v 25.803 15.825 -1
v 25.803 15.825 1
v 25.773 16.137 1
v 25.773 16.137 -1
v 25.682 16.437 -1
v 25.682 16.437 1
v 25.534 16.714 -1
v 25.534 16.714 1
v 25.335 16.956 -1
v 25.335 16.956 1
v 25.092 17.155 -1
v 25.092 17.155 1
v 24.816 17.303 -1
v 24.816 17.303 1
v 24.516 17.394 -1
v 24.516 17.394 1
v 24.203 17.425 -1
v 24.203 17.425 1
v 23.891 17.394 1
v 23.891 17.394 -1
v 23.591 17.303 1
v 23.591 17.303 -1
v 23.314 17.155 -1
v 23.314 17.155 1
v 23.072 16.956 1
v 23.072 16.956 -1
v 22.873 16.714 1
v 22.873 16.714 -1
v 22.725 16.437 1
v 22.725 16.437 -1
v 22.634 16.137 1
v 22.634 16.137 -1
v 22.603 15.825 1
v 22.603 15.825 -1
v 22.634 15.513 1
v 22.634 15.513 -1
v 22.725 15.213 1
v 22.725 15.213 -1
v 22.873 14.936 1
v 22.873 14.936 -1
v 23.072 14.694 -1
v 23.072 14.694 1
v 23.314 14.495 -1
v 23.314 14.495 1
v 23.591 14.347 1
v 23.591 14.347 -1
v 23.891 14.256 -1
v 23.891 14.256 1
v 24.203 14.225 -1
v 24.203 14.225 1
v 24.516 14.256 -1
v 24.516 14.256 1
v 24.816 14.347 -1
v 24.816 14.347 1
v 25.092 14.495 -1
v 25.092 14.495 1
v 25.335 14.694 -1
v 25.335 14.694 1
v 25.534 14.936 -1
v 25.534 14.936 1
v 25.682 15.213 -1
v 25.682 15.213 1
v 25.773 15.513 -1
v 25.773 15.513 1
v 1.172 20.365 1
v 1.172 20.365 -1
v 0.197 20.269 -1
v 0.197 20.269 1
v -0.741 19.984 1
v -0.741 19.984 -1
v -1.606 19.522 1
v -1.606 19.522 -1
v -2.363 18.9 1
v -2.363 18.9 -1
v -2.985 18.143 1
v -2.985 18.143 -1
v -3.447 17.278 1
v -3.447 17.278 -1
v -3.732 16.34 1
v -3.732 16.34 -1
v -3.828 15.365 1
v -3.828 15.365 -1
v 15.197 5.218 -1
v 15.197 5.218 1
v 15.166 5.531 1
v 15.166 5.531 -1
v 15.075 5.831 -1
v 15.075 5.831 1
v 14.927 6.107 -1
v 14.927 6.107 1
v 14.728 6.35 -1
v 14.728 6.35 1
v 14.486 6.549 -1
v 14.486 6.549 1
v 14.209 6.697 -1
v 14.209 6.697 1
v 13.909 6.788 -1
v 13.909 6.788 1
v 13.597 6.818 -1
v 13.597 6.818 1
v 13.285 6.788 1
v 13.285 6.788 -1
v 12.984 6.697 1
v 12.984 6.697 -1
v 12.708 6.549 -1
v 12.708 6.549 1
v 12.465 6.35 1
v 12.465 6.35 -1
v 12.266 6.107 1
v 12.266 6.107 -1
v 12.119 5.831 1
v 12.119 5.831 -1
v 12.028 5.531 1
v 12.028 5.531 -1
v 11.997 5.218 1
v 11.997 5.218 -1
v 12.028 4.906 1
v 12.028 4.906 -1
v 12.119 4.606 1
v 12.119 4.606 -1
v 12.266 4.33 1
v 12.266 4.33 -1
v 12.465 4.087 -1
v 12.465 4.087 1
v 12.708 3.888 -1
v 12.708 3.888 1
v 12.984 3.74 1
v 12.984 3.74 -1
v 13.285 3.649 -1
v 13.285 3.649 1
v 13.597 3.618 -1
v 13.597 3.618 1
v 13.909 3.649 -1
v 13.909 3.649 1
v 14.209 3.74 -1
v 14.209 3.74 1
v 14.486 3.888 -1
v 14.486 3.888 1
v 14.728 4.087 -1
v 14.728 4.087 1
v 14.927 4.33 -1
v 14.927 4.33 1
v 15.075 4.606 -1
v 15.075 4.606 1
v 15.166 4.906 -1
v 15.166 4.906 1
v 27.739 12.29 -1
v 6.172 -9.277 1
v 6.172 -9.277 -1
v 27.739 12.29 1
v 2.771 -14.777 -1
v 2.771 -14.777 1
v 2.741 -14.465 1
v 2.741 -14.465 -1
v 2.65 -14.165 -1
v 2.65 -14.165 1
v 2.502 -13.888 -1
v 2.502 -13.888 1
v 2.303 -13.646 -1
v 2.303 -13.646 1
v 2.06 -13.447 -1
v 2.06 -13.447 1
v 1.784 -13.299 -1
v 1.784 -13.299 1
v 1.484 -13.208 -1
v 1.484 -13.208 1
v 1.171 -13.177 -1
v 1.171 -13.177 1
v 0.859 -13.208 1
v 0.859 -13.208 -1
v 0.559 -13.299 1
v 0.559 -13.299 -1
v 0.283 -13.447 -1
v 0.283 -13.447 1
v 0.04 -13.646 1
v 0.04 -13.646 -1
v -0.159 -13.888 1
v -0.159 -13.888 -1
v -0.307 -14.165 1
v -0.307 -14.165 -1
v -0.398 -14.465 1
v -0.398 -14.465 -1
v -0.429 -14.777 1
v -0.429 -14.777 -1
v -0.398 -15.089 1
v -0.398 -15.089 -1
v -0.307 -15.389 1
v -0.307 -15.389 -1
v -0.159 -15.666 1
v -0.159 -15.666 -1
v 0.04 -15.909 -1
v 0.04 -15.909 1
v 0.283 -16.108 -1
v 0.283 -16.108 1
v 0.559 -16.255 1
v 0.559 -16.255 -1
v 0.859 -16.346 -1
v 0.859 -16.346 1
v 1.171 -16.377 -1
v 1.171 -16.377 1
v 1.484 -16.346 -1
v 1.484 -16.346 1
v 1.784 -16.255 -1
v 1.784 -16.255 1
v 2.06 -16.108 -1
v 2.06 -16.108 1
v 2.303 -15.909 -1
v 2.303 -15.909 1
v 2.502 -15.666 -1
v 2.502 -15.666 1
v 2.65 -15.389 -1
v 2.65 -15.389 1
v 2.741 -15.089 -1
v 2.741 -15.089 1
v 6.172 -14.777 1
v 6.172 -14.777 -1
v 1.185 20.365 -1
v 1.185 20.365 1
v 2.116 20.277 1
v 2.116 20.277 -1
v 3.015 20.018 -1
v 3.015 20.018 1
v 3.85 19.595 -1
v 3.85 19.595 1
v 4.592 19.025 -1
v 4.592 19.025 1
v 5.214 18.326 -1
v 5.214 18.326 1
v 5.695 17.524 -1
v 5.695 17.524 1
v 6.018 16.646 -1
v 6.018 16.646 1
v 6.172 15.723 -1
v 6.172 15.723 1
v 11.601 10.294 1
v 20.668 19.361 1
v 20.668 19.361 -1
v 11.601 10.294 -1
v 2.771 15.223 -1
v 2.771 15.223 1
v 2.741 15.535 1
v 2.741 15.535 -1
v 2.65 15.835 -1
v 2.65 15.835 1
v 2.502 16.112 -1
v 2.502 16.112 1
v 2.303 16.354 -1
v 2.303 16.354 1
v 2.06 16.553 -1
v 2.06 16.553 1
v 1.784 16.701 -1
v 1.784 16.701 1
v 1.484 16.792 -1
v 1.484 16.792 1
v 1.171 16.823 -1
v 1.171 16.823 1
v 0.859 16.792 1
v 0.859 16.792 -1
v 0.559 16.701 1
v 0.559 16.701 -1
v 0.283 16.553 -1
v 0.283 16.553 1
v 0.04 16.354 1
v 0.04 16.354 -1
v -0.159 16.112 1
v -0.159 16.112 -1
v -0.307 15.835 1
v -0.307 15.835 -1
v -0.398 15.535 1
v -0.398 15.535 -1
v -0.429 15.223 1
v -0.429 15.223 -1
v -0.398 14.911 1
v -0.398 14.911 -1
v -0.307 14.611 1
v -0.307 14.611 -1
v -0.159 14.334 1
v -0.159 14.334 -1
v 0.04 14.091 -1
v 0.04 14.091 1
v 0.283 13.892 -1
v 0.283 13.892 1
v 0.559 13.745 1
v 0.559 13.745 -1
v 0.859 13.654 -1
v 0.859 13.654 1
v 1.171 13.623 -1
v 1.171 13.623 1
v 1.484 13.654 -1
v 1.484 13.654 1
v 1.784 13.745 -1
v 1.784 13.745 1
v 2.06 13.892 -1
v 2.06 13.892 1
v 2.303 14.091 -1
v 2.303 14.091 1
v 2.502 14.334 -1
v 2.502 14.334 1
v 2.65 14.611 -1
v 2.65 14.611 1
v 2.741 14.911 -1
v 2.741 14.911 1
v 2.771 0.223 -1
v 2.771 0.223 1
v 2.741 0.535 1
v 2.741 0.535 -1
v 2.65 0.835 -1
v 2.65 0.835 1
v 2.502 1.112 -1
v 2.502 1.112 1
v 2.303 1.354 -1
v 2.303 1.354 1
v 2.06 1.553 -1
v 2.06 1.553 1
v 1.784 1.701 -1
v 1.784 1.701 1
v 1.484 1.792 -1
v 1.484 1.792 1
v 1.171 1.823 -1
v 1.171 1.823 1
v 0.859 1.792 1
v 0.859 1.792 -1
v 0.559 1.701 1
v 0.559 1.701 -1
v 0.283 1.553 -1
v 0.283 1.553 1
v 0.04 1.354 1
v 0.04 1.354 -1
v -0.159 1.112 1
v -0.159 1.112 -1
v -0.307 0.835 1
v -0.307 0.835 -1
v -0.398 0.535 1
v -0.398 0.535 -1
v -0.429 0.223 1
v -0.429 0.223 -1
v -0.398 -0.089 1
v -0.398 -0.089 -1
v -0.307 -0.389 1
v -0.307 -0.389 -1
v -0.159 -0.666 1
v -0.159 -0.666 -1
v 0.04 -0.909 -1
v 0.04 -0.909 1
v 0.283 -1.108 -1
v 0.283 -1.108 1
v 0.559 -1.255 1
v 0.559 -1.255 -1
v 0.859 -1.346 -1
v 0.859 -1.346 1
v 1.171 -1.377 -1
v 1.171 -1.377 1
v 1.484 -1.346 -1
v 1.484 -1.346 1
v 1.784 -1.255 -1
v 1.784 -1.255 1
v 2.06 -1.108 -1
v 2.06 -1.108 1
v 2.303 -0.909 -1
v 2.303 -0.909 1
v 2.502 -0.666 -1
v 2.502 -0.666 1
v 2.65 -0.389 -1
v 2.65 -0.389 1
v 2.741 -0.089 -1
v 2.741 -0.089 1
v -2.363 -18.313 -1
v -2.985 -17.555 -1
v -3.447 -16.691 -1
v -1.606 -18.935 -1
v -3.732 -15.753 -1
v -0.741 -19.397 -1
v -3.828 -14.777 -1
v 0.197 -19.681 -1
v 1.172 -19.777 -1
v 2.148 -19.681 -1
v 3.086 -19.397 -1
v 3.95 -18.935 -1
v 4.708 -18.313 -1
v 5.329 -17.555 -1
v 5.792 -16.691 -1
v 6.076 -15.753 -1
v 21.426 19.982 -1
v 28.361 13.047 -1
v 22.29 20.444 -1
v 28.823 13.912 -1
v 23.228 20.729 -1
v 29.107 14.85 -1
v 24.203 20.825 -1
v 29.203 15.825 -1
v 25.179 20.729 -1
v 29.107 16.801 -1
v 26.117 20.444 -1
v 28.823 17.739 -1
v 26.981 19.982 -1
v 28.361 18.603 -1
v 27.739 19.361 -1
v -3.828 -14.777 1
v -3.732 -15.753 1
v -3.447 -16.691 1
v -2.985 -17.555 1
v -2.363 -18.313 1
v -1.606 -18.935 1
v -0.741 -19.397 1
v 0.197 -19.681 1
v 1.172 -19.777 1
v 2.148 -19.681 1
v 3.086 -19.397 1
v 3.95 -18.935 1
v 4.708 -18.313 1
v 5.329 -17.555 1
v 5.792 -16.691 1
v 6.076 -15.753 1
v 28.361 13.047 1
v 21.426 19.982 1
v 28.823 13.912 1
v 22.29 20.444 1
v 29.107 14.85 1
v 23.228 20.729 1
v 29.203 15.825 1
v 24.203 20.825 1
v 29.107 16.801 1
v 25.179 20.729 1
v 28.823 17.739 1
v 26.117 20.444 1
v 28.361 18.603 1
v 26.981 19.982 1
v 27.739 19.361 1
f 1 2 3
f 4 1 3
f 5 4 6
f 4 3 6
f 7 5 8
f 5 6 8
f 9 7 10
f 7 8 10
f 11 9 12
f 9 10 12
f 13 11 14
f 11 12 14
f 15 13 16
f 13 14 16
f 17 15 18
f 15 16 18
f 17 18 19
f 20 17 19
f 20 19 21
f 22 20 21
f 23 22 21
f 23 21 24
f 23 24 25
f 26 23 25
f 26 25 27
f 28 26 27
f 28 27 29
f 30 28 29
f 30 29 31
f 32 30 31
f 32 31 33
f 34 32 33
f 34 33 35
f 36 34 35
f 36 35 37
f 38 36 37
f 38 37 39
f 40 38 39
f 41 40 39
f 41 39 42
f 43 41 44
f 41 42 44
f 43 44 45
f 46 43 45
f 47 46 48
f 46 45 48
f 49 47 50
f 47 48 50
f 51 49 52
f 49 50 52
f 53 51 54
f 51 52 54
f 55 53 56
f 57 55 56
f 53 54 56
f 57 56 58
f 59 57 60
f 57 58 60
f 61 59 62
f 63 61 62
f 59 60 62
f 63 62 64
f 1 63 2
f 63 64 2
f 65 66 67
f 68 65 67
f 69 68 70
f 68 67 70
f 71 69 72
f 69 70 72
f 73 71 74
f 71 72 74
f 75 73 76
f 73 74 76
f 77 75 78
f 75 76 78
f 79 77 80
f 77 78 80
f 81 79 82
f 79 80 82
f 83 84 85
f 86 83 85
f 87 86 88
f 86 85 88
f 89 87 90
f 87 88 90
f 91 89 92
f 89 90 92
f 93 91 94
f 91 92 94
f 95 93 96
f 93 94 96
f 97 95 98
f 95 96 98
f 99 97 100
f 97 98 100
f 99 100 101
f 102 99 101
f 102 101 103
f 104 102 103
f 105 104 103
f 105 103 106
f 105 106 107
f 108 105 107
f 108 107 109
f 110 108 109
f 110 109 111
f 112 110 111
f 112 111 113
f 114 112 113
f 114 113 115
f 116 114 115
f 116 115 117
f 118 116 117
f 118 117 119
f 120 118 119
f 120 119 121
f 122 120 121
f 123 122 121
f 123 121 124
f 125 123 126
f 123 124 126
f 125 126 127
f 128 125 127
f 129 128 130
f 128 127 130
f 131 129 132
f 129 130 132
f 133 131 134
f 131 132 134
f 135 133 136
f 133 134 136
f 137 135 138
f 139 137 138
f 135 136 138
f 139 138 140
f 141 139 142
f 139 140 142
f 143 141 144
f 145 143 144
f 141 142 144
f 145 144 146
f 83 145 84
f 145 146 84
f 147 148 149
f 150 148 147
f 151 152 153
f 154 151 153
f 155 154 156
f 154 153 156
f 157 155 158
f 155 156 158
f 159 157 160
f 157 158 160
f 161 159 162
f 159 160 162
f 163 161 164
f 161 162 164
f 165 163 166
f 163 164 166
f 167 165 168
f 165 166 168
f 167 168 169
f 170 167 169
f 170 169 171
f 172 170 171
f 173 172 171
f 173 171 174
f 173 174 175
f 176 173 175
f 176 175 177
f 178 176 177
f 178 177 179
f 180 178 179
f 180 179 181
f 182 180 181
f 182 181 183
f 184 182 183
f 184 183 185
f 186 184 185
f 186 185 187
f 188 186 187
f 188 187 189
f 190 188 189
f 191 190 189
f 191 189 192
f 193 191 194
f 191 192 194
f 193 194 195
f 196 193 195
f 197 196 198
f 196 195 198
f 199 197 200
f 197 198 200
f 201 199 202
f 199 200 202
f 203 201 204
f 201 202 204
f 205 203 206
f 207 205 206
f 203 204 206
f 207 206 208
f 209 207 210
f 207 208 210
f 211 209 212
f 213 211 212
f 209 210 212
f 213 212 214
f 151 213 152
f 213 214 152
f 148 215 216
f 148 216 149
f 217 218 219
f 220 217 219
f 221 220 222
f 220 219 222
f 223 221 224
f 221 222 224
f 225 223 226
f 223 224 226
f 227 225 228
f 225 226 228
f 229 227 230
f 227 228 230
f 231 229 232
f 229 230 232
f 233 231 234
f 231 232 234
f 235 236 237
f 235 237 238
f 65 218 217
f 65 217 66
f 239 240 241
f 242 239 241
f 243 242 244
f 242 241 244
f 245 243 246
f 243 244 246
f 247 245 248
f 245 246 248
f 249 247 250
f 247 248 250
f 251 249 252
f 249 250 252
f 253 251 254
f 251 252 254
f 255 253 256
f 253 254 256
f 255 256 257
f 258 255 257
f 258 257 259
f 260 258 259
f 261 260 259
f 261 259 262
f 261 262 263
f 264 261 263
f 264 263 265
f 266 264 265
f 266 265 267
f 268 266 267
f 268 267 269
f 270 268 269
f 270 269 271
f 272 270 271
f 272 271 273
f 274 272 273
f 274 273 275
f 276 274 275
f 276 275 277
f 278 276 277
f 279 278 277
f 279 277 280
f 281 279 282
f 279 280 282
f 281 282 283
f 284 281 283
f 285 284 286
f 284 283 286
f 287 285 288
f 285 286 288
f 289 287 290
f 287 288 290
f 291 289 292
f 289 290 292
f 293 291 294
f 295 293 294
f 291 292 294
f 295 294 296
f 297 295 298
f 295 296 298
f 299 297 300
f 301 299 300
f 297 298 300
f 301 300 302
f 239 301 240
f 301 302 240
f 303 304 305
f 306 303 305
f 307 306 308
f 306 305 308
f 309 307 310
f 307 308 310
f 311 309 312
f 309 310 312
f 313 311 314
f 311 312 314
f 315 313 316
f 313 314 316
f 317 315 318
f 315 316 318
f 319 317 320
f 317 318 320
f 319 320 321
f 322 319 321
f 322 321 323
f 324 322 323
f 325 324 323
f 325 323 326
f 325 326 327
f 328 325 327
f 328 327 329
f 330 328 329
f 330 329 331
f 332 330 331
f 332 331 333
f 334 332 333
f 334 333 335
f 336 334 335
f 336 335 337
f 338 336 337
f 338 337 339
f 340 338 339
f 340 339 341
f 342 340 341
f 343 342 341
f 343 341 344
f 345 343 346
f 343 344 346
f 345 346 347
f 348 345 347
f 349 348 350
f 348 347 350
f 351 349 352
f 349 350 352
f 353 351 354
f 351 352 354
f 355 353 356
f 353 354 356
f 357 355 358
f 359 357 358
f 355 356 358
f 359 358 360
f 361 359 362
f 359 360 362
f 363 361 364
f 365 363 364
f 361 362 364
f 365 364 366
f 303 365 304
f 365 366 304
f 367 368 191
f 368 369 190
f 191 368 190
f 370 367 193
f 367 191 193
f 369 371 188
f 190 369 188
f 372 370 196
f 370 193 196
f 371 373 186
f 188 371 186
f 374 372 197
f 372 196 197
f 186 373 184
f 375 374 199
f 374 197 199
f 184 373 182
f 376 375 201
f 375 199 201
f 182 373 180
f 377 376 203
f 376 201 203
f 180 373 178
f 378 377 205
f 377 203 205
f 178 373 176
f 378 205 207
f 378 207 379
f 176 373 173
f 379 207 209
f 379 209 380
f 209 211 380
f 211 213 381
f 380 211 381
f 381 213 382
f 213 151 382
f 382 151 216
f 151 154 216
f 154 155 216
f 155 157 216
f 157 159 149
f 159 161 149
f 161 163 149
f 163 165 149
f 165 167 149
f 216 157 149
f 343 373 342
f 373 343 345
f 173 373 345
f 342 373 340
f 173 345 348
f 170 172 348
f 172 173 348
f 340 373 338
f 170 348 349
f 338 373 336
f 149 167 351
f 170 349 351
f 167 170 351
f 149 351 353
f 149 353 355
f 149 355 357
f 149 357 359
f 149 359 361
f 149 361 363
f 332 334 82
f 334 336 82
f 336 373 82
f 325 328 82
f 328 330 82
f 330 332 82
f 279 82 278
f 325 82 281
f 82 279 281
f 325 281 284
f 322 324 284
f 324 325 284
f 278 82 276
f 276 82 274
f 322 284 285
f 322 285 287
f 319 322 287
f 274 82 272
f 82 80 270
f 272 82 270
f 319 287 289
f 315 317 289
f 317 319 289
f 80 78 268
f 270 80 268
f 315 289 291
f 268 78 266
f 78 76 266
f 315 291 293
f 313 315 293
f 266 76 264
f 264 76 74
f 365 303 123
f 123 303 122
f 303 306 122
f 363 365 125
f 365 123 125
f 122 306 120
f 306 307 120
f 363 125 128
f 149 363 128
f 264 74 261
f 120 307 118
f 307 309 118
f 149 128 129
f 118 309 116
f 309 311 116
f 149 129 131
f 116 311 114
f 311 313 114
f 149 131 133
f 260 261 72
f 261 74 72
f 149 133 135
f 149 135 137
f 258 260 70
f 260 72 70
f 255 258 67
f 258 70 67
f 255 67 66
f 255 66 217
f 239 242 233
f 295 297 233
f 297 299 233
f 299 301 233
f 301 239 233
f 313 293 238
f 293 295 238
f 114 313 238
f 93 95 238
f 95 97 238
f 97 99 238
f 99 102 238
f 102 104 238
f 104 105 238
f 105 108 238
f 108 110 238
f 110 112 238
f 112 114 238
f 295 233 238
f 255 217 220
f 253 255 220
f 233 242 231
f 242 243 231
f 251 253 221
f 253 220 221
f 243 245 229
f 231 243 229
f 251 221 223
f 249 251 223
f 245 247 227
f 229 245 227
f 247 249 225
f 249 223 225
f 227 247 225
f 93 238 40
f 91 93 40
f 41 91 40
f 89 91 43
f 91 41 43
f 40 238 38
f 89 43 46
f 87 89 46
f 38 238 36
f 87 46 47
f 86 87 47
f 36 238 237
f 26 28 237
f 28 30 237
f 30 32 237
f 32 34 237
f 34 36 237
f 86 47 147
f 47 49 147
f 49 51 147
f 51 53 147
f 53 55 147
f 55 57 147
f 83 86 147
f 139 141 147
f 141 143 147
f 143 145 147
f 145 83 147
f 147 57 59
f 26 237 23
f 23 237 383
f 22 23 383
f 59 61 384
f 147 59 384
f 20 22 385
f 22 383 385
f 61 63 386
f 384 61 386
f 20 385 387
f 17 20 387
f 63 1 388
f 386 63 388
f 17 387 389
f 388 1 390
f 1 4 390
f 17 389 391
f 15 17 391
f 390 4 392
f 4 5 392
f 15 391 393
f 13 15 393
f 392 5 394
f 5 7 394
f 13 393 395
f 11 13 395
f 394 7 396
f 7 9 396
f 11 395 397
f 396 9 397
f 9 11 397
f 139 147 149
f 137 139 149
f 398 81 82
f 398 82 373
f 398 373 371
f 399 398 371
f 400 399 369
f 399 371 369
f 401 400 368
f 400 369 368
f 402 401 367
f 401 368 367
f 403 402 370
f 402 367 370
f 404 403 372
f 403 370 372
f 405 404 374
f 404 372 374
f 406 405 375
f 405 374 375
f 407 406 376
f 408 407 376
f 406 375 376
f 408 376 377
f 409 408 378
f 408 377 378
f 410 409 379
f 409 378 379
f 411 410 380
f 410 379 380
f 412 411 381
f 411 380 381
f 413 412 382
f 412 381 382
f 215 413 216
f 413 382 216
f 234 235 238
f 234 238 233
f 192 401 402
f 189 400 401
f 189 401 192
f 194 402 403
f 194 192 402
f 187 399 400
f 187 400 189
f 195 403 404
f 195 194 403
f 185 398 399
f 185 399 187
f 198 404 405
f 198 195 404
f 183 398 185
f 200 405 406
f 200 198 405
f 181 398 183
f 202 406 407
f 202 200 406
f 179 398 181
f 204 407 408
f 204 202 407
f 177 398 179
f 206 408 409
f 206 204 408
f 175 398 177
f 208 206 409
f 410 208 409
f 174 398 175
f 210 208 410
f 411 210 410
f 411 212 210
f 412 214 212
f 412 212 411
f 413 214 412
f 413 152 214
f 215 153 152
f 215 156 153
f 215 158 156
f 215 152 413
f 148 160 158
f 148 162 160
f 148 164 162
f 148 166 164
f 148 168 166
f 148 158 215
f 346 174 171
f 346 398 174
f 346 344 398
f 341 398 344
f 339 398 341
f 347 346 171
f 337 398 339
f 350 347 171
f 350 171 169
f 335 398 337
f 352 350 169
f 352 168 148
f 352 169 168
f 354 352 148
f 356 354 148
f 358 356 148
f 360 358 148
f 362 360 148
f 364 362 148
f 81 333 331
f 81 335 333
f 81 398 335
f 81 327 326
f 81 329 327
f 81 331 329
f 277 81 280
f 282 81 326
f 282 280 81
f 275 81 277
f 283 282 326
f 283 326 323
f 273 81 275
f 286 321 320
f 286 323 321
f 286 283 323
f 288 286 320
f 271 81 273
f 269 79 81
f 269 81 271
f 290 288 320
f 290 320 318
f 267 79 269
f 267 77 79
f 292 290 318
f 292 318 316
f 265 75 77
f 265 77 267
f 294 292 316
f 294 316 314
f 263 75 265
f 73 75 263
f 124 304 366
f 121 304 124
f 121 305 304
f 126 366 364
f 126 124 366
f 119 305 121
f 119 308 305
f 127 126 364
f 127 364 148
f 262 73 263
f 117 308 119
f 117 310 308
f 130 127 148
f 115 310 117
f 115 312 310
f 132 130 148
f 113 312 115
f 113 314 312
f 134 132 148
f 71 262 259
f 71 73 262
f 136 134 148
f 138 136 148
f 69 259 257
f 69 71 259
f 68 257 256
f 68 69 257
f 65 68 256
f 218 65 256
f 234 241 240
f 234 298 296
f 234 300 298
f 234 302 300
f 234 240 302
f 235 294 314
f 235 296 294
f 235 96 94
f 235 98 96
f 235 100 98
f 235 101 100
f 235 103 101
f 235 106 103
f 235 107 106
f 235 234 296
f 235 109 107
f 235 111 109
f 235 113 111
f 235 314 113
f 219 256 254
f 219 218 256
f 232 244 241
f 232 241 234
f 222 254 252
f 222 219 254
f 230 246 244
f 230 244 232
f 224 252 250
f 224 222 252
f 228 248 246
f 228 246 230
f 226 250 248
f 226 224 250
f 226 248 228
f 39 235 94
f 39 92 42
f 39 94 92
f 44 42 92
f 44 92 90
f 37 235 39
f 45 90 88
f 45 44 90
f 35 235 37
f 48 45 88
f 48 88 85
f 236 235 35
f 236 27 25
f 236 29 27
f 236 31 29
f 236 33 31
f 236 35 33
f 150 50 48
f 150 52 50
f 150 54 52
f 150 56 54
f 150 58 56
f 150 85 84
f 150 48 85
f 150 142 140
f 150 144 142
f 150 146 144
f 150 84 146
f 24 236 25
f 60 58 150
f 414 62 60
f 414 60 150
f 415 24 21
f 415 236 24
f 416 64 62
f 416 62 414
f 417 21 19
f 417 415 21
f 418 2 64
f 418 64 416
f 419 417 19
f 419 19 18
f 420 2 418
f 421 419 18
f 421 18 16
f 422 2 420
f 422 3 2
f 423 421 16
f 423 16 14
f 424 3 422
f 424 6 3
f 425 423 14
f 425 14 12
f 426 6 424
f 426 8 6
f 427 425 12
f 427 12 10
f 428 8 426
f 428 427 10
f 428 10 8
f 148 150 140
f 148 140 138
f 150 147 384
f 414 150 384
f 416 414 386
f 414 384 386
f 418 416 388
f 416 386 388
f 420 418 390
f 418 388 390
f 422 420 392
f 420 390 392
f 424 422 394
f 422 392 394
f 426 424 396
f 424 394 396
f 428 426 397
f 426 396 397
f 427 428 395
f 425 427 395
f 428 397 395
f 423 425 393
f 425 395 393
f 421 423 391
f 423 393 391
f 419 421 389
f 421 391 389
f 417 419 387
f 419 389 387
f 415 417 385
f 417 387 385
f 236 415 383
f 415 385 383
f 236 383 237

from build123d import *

# Parameters (mm, degrees)
EXTRUDE_1_DEPTH     = 1
FILLET_1_R          = 5
SKETCH_2_R          = 1.6
CUT_EXTRUDE_1_DEPTH = 36.923820844


with BuildPart() as part:
    # ｽｹｯﾁ1 → ﾎﾞｽ - 押し出し1 (new, symmetric)
    with BuildSketch(Plane.XY):
        Polygon((-3.827856705, 20.364933264), (-3.827856705, -19.777202359), (6.172143295, -19.777202359), (6.172143295, -9.277202359), (31.274434027, 15.825088373), (24.203366215, 22.896156185), (11.601075483, 10.293865452), (6.172143295, 15.722797641), (6.172143295, 20.364933264), align=None)
    extrude(amount=EXTRUDE_1_DEPTH, both=True)

    # ﾌｨﾚｯﾄ1
    # the kernel refuses this fillet: 5 mm, written as the material it takes off along each edge
    with BuildSketch(Plane(origin=(24.203366215, 22.896156185, -13.5), x_dir=(-0.7071067811865422, -0.7071067811865529, 0), z_dir=(0, 0, 1)), Plane(origin=(-3.827856705, -19.777202359, -13.5), x_dir=(1, 0, 0), z_dir=(0, 0, 1)), Plane(origin=(6.172143295, -19.777202359, -13.5), x_dir=(0, 1, 0), z_dir=(0, 0, 1)), Plane(origin=(31.274434027, 15.825088373, -13.5), x_dir=(-0.7071067811865479, 0.7071067811865471, 0), z_dir=(0, 0, 1))) as fillet_1_piece_1:
        with BuildLine():
            CenterArc((FILLET_1_R, FILLET_1_R), FILLET_1_R, 180, 90)
            Line((0, FILLET_1_R), (-FILLET_1_R * 0.02, FILLET_1_R))
            Line((-FILLET_1_R * 0.02, FILLET_1_R), (-FILLET_1_R * 0.02, -FILLET_1_R * 0.02))
            Line((-FILLET_1_R * 0.02, -FILLET_1_R * 0.02), (FILLET_1_R, -FILLET_1_R * 0.02))
            Line((FILLET_1_R, -FILLET_1_R * 0.02), (FILLET_1_R, 0))
        make_face()
    extrude(amount=27, mode=Mode.SUBTRACT)
    with BuildSketch(Plane(origin=(-3.827856705, 20.364933264, -13.5), x_dir=(1, 0, 0), z_dir=(0, 0, 1))) as fillet_1_piece_2:
        with BuildLine():
            CenterArc((FILLET_1_R, -FILLET_1_R), FILLET_1_R, 90, 90)
            Line((0, -FILLET_1_R), (-FILLET_1_R * 0.02, -FILLET_1_R))
            Line((-FILLET_1_R * 0.02, -FILLET_1_R), (-FILLET_1_R * 0.02, FILLET_1_R * 0.02))
            Line((-FILLET_1_R * 0.02, FILLET_1_R * 0.02), (FILLET_1_R, FILLET_1_R * 0.02))
            Line((FILLET_1_R, FILLET_1_R * 0.02), (FILLET_1_R, 0))
        make_face()
    extrude(amount=27, mode=Mode.SUBTRACT)
    with BuildSketch(Plane(origin=(6.172143295, 20.364933264, 13.467942164), x_dir=(-1, 0, 0), z_dir=(0, 0, -1))) as fillet_1_piece_3:
        with BuildLine():
            CenterArc((4.987176866, -5), FILLET_1_R, 90, 85.895667026)
            Line((0, -4.642135624), (-0.099743537, -4.634978336))
            ThreePointArc((-0.099743537, -4.634978336), (-0.1, -2.321067812), (-0.1, 0))
            Line((-0.1, 0), (0, 0.1))
            Line((0, 0.1), (4.987176866, 0.1))
            Line((4.987176866, 0.1), (4.987176866, 0))
        make_face()
    extrude(amount=26.935884328, mode=Mode.SUBTRACT)

    # ｽｹｯﾁ2 → ｶｯﾄ - 押し出し1 (cut, through all)
    with BuildSketch(Plane.XY.offset(1)):
        with Locations((1.171422694, -14.777202359)):
            Circle(SKETCH_2_R)
        with Locations((13.596764497, 5.218486655)):
            Circle(SKETCH_2_R)
        with Locations((24.203366215, 15.825088373)):
            Circle(SKETCH_2_R)
        with Locations((1.171422694, 0.222797641)):
            Circle(SKETCH_2_R)
        with Locations((1.171422694, 15.222797641)):
            Circle(SKETCH_2_R)
    extrude(amount=-CUT_EXTRUDE_1_DEPTH, mode=Mode.SUBTRACT)


solid = part.part
